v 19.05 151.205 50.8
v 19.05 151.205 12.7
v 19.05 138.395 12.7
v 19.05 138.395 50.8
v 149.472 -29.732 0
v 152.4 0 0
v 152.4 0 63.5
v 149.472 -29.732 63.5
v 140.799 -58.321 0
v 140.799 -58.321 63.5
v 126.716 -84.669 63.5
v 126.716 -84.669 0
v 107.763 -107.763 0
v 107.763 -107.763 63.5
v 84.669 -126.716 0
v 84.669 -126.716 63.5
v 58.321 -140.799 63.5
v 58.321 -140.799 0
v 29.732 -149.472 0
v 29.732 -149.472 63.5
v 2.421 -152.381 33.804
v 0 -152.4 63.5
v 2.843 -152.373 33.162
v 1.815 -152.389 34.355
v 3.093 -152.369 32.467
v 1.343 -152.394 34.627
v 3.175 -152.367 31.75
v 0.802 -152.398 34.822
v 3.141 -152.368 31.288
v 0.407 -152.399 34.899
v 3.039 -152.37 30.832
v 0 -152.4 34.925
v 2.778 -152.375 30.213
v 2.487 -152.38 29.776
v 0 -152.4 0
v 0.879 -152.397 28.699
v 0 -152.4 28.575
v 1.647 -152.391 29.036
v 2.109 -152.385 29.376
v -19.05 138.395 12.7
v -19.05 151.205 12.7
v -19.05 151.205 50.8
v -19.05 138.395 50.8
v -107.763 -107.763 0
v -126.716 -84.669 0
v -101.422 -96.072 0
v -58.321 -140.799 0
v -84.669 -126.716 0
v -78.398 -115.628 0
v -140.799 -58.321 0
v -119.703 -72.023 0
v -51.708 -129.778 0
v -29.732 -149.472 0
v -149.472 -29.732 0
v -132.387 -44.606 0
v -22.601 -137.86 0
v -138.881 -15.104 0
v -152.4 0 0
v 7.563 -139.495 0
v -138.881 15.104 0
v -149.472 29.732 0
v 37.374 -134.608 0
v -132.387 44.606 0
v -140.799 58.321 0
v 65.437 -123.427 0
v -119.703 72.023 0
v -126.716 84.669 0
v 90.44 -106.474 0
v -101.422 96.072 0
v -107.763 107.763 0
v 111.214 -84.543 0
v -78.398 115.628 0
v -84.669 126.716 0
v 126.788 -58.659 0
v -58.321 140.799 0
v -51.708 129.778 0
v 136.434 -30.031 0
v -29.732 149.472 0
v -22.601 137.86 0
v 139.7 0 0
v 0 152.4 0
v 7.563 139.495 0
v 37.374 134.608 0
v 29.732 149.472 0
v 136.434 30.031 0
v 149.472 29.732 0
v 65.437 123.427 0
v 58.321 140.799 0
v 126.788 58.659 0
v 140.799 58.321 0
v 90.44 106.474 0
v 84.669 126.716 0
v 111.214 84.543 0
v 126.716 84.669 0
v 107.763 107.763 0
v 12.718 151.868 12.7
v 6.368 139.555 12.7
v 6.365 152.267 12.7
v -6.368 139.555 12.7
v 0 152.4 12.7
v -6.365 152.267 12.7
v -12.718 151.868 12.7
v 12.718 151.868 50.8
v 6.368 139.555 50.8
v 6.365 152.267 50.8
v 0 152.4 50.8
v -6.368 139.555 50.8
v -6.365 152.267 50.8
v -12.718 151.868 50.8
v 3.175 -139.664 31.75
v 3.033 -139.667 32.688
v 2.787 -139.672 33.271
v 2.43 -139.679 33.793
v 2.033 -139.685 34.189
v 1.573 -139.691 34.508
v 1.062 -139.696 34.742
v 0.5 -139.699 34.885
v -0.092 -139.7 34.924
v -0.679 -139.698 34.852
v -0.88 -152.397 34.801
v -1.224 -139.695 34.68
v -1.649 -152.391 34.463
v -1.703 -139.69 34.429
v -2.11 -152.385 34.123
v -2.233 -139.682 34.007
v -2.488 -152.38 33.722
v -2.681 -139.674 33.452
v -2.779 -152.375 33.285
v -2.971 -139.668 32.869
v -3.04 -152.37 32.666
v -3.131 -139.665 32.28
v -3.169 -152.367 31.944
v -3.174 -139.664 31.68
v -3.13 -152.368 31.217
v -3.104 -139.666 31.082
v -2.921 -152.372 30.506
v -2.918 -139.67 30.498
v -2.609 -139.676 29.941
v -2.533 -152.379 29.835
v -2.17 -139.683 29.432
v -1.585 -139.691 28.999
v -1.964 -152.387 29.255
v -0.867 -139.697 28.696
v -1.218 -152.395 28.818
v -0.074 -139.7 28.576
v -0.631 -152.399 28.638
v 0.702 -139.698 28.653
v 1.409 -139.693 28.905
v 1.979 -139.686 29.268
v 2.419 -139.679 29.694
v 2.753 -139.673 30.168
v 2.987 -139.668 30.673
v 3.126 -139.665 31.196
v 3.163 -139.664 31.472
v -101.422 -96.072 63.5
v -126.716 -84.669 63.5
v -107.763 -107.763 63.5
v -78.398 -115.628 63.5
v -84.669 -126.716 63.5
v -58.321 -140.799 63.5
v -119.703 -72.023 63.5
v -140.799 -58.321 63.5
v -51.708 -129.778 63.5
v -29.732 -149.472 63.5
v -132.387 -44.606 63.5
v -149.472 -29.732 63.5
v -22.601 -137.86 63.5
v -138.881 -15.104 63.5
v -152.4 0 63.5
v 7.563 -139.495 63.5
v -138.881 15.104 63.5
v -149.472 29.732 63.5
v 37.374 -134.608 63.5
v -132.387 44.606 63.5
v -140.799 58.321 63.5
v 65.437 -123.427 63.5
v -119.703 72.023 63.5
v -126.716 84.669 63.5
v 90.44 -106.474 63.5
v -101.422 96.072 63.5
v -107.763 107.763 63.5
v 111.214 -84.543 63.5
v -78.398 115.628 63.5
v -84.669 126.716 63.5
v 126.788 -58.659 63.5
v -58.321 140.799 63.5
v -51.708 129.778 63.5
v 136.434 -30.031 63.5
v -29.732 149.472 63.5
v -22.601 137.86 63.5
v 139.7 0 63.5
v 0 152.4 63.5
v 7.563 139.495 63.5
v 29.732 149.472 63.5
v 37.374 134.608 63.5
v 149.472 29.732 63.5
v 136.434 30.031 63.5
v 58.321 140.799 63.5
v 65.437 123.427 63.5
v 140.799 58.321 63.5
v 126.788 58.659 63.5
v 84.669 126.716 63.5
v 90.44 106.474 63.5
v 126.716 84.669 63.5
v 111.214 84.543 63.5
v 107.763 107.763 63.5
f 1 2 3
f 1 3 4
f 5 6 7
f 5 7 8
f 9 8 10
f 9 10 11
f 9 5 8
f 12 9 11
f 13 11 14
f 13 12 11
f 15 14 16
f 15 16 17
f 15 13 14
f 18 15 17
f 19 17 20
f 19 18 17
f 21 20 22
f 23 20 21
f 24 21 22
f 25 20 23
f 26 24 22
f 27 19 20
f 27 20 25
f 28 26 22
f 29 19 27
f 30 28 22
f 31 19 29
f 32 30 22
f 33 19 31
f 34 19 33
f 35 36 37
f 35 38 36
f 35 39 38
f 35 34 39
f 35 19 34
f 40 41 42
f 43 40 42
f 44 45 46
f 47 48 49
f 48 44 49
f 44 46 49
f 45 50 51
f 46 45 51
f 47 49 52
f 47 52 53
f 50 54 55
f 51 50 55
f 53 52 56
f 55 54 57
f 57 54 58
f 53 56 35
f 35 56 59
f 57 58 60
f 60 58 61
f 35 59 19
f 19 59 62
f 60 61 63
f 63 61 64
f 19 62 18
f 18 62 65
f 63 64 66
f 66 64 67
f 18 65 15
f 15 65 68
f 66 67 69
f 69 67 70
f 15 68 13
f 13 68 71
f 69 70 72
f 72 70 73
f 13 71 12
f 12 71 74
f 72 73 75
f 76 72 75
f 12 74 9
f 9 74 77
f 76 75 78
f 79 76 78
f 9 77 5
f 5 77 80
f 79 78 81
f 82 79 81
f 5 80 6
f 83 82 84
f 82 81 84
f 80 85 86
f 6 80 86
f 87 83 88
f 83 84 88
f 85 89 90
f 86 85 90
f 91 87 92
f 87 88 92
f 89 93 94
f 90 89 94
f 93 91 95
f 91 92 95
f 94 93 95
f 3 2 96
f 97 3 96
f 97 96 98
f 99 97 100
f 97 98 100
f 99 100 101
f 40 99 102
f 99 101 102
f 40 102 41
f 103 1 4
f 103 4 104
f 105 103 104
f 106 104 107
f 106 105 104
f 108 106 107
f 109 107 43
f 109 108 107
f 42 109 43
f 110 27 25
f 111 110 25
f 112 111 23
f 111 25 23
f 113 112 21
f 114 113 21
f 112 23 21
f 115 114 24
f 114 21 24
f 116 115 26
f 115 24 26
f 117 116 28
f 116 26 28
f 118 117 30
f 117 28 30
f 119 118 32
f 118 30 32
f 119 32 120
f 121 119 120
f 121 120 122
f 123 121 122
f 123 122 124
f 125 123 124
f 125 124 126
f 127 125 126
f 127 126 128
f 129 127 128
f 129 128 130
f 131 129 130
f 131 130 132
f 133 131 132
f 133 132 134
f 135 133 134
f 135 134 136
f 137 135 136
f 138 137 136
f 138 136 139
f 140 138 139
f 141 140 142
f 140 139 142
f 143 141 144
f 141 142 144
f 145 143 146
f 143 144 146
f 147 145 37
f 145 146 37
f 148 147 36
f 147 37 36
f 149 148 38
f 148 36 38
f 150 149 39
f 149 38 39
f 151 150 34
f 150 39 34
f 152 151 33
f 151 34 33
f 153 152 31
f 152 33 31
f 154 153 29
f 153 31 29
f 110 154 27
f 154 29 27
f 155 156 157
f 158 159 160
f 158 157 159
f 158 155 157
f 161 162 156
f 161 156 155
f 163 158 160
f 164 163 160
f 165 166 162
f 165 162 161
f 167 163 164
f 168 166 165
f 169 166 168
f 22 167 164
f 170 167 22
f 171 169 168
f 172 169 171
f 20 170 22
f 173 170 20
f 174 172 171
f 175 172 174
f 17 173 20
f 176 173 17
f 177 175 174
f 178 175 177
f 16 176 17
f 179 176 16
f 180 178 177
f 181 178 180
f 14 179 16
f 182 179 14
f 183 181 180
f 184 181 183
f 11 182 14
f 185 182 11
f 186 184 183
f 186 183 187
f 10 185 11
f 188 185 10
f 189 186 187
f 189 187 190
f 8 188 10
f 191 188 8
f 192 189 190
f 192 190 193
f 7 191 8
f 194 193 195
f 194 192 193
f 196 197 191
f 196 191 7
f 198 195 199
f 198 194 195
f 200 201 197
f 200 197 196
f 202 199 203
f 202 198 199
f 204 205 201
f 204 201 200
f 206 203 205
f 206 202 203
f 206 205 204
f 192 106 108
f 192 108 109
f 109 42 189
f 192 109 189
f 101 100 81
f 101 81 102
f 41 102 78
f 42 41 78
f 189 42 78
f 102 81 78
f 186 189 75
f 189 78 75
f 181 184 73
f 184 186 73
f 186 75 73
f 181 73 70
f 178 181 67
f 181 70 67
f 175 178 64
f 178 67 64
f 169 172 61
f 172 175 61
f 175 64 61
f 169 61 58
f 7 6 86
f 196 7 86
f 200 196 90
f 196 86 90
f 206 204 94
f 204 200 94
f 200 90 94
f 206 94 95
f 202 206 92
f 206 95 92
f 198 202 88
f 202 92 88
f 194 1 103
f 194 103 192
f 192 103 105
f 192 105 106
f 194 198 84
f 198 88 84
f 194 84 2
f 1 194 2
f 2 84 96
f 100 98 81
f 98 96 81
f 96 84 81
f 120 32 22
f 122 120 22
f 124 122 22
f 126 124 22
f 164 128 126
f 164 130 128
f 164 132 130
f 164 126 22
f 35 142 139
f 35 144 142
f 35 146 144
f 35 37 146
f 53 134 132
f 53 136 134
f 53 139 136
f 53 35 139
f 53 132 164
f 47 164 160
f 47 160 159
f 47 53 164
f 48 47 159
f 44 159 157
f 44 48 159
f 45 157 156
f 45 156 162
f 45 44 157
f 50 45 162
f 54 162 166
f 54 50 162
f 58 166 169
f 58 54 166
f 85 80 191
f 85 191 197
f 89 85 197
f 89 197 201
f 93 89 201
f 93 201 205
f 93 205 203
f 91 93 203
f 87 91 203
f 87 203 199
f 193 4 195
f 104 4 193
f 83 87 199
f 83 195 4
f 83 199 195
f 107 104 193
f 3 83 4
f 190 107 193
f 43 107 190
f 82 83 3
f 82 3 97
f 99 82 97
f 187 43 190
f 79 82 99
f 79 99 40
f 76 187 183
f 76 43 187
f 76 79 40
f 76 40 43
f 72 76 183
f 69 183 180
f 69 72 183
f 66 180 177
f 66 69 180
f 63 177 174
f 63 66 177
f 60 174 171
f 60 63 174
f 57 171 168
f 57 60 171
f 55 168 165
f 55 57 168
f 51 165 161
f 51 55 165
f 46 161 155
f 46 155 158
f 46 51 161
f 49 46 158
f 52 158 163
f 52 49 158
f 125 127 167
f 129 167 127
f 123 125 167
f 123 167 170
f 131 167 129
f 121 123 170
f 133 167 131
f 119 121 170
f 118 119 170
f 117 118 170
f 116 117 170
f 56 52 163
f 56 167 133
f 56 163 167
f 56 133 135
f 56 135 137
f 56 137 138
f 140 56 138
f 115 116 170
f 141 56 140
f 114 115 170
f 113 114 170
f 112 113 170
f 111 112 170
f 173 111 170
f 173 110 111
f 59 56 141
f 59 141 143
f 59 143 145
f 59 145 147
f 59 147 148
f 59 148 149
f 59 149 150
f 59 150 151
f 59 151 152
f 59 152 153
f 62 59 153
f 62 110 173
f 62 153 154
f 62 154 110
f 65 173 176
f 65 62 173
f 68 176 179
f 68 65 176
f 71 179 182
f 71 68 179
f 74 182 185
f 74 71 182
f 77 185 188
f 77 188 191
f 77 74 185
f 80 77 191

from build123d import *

# Parameters (mm, degrees)
F0_W        = 304.8
F0_H        = 304.8
F0_R        = 139.7
F1_DEPTH    = 63.5
F3_D        = 6.35
F2_W        = 38.1
F2_H        = 38.1
F2_R        = 1.5875
F4_DEPTH    = 25.4
F5_T1_DEPTH = 825.5


# Not quite as in the source:
# - a fillet or chamfer that OpenCascade refuses, or shapes differently, is made with other operations: its cross-section is extruded or revolved along the edge and cut away or added


with BuildPart() as f1:
    # F0 (on Top) → F1 (new body)
    with BuildSketch(Plane.XY):
        Rectangle(F0_W, F0_H)
        Circle(F0_R, mode=Mode.SUBTRACT)
    extrude(amount=F1_DEPTH)

    # F3 (through all)
    with Locations(Plane(origin=(0, 152.4, 0), x_dir=(-1, 0, 0), z_dir=(0, 1, 0))):
        with Locations((0, 31.75)):
            Hole(F3_D / 2)

    # F2 (on face) → F4 (cut)
    with BuildSketch(Plane(origin=(0, 152.4, 0), x_dir=(-1, 0, 0), z_dir=(0, 1, 0))):
        with Locations((0, 31.75)):
            Rectangle(F2_W, F2_H)
        with Locations((0, 31.75)):
            Circle(F2_R, mode=Mode.SUBTRACT)
    extrude(amount=-F4_DEPTH, mode=Mode.SUBTRACT)

    # F5: fillet of radius 152.4 on 4 edges, made by hand

    # F5_s2 → F5_t1 (cut)
    with BuildSketch(Plane.XY.offset(-381)):
        with BuildLine():
            ThreePointArc((0, 152.4), (-107.7630734528, 107.7630734528), (-152.4, 0))
            Line((-152.4, 0), (-152.4, 152.4))
            Line((-152.4, 152.4), (0, 152.4))
        make_face()
        with BuildLine():
            ThreePointArc((152.4, 0), (107.7630734528, 107.7630734528), (0, 152.4))
            Line((0, 152.4), (152.4, 152.4))
            Line((152.4, 152.4), (152.4, 0))
        make_face()
        with BuildLine():
            ThreePointArc((152.4, 0), (107.7630734528, -107.7630734528), (0, -152.4))
            Line((0, -152.4), (152.4, -152.4))
            Line((152.4, -152.4), (152.4, 0))
        make_face()
        with BuildLine():
            ThreePointArc((0, -152.4), (-107.7630734528, -107.7630734528), (-152.4, 0))
            Line((-152.4, 0), (-152.4, -152.4))
            Line((-152.4, -152.4), (0, -152.4))
        make_face()
    extrude(amount=F5_T1_DEPTH, mode=Mode.SUBTRACT)


solid = f1.part
